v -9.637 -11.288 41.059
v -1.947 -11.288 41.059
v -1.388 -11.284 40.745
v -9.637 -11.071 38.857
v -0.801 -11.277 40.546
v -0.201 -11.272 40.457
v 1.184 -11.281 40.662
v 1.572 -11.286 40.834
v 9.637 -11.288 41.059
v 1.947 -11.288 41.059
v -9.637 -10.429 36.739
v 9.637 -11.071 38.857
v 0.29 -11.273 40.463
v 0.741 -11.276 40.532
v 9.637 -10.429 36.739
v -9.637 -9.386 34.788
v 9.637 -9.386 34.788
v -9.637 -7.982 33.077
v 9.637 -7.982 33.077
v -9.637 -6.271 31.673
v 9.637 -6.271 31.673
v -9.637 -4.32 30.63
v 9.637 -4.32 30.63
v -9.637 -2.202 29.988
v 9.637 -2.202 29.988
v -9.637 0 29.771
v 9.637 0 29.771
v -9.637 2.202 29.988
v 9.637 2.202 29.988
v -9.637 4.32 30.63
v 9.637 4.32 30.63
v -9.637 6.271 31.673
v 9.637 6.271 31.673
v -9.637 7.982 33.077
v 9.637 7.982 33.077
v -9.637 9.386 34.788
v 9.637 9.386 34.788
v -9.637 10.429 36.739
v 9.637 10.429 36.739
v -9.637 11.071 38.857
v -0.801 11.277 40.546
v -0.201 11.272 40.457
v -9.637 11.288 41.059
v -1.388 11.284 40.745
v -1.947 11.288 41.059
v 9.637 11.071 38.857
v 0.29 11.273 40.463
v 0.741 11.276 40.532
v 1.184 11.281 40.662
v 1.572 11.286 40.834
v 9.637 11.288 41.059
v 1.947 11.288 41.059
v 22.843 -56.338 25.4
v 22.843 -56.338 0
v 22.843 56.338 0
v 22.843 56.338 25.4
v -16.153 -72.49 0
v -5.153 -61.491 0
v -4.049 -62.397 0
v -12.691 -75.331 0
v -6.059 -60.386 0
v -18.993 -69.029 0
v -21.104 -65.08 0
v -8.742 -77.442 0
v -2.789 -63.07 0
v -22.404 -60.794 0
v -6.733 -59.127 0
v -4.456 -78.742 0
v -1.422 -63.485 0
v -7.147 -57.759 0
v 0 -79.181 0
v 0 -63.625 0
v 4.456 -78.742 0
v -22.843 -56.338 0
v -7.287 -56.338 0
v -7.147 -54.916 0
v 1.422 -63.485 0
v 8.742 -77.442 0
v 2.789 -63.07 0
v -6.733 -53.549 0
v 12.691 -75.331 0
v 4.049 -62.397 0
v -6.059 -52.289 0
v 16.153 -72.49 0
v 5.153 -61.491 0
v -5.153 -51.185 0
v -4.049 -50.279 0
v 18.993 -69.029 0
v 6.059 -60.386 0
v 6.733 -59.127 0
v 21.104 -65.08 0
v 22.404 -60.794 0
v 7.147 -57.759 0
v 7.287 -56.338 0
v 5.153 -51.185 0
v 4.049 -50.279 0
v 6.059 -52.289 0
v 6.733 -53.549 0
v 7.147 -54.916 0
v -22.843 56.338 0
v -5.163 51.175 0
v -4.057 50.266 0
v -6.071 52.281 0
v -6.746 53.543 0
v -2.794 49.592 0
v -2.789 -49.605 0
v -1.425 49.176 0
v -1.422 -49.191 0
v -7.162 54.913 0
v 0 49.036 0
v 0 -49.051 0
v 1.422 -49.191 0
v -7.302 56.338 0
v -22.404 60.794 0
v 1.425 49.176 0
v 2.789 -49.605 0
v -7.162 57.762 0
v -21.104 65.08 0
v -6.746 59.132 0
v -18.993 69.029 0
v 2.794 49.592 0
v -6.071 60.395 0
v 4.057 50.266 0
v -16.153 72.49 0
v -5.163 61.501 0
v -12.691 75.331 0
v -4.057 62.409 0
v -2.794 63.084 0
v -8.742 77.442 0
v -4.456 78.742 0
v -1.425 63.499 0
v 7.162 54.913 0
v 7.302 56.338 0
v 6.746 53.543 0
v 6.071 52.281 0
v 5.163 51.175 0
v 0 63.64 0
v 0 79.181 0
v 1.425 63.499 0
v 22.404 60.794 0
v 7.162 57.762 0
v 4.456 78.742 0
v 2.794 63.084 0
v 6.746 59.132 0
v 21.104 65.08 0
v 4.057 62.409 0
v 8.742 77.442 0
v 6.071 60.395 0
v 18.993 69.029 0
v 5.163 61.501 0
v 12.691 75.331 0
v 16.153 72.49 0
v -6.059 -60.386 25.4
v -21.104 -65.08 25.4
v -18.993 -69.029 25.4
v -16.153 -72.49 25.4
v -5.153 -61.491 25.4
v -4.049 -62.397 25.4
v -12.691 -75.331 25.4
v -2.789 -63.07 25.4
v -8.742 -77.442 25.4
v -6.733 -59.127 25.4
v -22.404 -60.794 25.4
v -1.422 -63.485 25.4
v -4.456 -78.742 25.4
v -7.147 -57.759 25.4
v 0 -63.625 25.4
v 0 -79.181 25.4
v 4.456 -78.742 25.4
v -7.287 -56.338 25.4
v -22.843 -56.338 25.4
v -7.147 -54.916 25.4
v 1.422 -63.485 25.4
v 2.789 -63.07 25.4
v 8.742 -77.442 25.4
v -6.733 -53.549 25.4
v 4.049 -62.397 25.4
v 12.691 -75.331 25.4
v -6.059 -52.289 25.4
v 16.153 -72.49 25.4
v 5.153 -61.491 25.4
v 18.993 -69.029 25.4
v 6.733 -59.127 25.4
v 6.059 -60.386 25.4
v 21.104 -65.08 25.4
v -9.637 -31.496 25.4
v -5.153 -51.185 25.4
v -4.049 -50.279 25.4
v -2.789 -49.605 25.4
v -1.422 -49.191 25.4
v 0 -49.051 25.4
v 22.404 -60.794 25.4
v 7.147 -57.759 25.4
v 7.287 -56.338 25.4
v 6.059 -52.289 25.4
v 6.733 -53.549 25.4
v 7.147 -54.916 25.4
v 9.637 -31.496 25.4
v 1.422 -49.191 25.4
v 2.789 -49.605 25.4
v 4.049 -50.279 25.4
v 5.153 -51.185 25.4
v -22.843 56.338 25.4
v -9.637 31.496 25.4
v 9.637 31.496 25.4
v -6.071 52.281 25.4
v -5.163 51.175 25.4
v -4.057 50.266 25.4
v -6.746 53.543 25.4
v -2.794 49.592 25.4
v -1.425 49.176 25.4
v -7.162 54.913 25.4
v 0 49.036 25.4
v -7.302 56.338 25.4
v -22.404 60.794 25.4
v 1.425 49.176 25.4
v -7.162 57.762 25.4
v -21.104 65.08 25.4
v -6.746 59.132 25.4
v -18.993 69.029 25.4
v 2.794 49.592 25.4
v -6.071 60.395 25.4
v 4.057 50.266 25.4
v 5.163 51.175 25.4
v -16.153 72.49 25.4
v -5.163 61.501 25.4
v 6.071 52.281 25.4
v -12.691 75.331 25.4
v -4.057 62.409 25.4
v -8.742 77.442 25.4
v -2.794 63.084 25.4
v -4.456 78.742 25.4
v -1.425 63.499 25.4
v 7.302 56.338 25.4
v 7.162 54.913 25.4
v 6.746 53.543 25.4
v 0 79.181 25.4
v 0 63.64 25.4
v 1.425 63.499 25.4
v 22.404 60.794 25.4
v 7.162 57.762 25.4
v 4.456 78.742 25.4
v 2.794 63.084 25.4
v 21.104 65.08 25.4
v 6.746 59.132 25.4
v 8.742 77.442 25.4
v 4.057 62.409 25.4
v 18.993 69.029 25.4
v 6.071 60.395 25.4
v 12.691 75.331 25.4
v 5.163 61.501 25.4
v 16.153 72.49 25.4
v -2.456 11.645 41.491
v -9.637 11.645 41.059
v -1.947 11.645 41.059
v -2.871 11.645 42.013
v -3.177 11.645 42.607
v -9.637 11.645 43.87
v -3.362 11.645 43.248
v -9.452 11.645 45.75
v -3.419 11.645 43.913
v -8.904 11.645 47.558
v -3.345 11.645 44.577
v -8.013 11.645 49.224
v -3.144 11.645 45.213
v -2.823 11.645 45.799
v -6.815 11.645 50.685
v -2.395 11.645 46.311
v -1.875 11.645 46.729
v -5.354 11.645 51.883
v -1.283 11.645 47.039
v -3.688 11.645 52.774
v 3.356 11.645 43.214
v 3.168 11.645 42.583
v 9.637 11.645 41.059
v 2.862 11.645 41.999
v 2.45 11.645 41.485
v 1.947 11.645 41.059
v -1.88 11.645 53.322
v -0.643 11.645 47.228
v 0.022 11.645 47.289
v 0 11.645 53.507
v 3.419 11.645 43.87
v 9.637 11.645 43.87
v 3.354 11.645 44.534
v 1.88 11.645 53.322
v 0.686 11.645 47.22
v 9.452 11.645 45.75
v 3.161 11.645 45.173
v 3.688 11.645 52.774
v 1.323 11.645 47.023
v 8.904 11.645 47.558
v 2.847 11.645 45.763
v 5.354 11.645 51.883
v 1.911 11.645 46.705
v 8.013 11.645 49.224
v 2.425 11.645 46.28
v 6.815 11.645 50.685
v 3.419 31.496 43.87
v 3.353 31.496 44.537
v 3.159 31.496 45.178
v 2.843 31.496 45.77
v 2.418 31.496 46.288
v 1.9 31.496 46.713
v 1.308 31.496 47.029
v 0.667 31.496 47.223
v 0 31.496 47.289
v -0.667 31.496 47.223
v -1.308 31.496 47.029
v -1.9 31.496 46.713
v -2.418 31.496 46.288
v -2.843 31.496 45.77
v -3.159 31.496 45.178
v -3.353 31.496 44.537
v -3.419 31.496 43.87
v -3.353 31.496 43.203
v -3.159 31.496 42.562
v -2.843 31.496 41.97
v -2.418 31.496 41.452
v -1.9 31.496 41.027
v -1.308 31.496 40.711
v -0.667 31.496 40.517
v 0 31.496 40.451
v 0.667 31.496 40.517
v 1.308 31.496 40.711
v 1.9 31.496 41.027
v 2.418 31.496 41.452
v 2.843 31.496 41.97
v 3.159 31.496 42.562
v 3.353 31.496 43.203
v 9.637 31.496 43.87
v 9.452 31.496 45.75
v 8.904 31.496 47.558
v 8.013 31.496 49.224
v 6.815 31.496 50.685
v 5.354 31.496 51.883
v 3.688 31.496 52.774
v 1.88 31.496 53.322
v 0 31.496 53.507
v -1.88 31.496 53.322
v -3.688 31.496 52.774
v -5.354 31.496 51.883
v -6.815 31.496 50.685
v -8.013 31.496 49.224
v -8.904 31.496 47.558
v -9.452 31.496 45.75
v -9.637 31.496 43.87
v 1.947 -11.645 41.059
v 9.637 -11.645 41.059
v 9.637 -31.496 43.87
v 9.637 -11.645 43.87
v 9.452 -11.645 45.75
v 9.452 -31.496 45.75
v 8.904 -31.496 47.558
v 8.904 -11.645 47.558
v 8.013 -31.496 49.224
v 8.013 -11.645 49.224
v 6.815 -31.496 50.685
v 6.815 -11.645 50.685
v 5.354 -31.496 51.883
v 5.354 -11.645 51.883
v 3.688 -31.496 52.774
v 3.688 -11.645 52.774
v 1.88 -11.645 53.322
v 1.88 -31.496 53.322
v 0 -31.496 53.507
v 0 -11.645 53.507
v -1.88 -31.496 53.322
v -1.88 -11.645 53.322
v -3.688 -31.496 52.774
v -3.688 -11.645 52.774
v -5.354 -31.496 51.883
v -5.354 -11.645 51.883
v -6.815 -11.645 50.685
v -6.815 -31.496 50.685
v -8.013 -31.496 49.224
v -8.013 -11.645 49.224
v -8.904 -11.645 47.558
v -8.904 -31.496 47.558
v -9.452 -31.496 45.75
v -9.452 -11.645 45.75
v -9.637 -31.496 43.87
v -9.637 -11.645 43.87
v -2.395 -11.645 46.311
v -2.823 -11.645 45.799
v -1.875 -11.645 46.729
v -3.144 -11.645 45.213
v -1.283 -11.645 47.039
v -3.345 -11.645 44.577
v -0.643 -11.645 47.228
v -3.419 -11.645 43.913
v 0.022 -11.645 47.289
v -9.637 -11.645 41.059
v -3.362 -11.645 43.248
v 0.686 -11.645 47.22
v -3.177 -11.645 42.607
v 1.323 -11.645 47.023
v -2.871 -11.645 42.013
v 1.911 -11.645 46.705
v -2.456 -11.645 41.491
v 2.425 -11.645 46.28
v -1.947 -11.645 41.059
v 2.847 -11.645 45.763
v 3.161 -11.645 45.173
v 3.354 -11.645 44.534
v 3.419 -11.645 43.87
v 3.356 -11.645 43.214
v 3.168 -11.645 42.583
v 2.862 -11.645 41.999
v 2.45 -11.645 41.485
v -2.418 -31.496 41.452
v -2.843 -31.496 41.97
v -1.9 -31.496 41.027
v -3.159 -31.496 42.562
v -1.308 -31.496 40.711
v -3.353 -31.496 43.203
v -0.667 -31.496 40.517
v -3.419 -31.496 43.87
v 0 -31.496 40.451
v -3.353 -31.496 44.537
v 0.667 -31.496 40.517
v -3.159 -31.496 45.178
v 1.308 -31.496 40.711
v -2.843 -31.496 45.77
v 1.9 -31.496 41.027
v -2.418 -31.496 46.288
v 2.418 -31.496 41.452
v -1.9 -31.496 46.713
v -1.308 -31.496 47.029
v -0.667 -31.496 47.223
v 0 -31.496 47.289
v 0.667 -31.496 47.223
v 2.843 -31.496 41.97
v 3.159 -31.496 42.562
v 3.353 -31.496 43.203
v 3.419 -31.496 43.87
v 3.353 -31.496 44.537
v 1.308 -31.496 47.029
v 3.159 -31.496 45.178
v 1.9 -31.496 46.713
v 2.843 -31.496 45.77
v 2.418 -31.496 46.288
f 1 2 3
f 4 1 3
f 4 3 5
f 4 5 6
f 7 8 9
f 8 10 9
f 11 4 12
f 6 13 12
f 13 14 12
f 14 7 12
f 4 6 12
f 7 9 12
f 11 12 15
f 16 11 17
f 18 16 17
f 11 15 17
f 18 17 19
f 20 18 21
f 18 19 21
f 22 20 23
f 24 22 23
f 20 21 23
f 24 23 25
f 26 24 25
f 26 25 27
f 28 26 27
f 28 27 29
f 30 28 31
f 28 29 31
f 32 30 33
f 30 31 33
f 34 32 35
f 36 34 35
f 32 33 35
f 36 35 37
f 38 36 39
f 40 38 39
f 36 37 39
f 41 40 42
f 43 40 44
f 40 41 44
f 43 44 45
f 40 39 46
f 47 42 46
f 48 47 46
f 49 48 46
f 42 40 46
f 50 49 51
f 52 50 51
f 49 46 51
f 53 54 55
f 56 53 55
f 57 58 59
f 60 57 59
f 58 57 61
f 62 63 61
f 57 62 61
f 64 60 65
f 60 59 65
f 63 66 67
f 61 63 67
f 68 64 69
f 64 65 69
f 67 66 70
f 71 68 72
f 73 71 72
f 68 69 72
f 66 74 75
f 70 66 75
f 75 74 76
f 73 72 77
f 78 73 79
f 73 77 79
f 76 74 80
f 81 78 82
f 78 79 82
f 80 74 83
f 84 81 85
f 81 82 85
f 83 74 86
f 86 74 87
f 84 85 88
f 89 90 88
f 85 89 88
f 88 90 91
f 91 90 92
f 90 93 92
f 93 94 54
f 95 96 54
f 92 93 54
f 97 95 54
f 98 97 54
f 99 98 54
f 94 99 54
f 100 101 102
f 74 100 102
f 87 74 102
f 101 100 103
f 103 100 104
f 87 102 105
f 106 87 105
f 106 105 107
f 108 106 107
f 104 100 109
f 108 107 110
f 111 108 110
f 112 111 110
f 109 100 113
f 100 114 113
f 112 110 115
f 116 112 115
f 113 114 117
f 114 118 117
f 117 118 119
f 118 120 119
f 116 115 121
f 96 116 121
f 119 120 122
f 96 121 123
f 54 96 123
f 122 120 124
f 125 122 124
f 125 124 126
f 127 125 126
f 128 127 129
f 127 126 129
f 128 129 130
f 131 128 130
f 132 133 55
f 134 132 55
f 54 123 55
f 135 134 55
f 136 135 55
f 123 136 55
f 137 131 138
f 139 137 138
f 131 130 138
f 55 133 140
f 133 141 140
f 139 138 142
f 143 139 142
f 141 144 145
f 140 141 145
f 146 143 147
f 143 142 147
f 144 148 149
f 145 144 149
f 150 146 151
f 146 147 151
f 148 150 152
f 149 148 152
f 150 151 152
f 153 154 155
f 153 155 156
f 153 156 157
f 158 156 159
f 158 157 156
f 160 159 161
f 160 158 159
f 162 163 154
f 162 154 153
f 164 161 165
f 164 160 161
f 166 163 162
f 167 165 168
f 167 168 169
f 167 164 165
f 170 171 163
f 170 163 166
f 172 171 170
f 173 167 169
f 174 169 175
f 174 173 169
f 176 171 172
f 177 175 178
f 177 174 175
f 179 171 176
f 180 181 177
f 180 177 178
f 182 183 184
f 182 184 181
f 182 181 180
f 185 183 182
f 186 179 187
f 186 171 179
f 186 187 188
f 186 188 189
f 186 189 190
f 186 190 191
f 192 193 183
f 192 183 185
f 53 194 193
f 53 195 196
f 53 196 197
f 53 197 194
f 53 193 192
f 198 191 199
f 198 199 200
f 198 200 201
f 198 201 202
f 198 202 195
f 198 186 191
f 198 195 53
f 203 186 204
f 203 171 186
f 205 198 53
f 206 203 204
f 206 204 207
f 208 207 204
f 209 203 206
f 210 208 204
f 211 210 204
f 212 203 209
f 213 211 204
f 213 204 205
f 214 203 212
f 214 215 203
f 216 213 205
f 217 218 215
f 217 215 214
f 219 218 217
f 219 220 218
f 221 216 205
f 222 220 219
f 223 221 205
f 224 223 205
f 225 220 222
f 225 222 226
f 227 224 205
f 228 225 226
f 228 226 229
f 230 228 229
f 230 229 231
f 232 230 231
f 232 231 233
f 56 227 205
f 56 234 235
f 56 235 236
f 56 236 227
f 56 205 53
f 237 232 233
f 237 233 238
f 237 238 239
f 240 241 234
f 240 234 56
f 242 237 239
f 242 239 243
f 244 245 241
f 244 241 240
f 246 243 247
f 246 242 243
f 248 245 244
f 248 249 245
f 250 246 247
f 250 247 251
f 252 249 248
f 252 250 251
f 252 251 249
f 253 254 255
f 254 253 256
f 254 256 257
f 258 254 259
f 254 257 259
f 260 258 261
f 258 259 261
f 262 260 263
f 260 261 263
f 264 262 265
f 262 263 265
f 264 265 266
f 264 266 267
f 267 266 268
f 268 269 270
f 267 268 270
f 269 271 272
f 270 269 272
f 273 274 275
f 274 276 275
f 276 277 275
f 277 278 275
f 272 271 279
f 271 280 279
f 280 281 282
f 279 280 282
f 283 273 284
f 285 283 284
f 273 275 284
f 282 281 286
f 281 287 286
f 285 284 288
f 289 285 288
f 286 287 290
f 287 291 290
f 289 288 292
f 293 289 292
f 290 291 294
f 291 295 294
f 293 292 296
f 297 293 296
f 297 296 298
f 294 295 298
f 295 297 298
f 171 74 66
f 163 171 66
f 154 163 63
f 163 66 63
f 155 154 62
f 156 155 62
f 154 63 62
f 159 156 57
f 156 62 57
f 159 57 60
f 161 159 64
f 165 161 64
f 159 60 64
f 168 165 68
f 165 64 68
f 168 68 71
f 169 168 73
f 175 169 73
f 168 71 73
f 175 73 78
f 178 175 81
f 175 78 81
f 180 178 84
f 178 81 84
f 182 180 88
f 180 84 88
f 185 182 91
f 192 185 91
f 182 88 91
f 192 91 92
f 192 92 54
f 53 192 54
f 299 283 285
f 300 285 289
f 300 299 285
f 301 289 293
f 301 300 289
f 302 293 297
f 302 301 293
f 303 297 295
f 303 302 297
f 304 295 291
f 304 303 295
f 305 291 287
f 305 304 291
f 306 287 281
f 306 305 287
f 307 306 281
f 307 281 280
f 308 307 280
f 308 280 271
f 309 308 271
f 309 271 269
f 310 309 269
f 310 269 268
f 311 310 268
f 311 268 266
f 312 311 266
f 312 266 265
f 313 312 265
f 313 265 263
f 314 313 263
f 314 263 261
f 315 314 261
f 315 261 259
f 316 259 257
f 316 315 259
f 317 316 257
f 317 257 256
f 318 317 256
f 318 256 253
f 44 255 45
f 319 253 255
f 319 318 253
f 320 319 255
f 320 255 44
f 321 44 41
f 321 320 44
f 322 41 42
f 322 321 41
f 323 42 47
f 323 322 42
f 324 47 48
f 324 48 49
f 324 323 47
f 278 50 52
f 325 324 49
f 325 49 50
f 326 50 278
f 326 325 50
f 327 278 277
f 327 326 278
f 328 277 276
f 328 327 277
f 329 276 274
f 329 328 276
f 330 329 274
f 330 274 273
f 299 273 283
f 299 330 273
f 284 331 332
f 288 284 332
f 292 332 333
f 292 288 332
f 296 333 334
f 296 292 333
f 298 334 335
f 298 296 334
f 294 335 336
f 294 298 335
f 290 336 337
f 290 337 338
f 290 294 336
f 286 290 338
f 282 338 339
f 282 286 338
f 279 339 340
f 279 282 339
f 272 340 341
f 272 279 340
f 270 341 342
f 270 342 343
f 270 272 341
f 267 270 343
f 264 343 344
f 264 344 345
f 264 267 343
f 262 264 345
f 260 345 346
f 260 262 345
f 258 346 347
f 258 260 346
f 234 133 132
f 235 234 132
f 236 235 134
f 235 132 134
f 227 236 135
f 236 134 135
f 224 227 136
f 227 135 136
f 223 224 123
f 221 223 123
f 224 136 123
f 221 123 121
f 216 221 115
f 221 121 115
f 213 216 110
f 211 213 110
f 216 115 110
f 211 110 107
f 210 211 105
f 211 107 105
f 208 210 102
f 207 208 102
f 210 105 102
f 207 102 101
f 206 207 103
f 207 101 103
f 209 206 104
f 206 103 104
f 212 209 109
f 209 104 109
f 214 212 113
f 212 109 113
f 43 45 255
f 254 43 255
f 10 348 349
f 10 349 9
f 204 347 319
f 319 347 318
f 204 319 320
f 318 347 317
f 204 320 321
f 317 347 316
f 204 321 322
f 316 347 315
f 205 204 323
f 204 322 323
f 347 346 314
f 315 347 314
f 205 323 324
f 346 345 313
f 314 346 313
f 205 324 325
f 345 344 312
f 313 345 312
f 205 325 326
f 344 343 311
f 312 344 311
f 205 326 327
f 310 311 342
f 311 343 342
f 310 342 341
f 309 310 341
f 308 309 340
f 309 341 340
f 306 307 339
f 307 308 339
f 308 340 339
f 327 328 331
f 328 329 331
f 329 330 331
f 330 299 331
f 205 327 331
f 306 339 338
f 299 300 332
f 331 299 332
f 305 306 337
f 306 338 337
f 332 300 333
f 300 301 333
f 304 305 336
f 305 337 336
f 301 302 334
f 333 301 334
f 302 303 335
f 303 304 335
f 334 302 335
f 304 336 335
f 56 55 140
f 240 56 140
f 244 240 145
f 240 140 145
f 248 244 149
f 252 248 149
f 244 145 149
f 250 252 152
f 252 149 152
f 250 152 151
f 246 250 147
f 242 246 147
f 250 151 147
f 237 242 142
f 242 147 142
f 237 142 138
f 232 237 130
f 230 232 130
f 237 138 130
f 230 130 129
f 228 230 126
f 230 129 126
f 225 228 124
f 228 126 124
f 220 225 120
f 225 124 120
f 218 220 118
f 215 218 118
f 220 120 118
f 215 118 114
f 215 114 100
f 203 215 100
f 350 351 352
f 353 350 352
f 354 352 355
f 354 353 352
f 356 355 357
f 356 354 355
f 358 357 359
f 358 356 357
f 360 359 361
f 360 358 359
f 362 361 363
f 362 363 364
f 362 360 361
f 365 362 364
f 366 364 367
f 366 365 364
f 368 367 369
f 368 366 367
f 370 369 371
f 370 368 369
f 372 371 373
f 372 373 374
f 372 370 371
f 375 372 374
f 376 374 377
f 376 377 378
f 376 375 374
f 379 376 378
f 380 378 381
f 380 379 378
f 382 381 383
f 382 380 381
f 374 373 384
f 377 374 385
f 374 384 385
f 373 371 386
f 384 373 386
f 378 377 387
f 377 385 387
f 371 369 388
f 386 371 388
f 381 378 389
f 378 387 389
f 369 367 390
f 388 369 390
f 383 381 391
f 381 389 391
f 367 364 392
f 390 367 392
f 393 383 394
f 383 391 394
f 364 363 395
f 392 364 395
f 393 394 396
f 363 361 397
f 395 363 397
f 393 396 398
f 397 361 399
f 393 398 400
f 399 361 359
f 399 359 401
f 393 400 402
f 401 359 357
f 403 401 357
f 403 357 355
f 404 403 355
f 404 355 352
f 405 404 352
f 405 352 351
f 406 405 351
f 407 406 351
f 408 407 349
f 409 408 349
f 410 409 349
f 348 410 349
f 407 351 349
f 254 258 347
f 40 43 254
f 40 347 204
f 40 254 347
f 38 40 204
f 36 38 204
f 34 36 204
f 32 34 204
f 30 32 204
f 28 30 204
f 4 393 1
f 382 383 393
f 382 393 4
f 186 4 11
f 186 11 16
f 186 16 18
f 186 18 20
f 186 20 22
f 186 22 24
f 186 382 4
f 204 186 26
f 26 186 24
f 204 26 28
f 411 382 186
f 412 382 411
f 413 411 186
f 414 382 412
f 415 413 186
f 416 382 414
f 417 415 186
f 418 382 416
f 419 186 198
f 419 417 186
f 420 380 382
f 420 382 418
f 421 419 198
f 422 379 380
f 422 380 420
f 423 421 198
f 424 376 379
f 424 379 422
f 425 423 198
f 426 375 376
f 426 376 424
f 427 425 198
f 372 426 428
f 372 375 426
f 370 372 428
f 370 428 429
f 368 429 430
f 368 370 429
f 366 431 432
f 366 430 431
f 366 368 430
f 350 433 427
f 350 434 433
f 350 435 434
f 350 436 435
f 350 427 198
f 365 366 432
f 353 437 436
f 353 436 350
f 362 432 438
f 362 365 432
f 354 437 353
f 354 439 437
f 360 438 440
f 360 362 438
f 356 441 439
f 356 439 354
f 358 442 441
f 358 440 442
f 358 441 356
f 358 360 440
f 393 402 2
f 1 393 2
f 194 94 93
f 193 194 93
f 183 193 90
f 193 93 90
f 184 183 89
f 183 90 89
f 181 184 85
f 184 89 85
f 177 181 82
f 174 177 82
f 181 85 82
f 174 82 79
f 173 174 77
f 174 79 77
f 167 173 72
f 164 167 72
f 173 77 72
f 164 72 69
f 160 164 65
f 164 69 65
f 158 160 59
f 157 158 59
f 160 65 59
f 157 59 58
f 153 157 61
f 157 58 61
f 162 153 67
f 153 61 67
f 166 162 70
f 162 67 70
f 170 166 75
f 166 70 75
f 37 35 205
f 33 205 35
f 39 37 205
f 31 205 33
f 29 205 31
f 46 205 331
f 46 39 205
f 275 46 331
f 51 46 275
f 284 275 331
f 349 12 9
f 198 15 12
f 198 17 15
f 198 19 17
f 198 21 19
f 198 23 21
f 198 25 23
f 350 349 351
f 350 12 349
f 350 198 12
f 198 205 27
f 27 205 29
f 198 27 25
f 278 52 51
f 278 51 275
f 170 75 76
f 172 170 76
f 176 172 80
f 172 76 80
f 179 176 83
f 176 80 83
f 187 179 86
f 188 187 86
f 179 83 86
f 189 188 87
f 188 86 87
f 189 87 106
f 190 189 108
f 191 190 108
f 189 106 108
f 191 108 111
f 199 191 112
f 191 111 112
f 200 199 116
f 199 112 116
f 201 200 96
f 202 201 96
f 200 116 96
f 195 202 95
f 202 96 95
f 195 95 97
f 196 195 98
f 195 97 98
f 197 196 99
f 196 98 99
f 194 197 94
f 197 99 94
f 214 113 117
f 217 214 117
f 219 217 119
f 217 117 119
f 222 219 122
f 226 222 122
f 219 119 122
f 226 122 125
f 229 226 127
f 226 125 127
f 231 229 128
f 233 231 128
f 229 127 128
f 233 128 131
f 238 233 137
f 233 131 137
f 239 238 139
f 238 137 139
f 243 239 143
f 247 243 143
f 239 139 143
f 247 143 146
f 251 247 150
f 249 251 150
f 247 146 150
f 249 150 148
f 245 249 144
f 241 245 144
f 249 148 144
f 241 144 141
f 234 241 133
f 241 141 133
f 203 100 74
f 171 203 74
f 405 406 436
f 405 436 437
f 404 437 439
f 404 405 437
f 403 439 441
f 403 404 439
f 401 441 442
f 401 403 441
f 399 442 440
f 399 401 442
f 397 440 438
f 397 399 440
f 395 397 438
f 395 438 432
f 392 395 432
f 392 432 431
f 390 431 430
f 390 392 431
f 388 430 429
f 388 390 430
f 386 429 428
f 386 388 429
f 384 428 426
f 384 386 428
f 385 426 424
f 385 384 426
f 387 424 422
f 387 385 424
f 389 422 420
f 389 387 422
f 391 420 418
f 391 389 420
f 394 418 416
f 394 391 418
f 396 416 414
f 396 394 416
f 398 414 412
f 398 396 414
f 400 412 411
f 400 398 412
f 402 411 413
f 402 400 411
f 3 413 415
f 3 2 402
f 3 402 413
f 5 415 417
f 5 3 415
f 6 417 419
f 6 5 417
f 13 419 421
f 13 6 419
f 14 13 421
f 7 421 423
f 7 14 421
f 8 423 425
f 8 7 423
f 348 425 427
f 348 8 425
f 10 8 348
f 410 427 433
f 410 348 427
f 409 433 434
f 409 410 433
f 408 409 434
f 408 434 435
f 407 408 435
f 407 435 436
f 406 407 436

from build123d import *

# Parameters (mm, degrees)
F1_DEPTH = 25.4
F2_R     = 3.419127
F3_DEPTH = 31.496
F5_DEPTH = 36.322


with BuildPart() as f1:
    # F0 (on Top) → F1 (new body)
    with BuildSketch(Plane.XY):
        with BuildLine():
            ThreePointArc((-22.843207, -56.337804), (0, -79.181011), (22.843207, -56.337804))
            Line((22.843207, -56.337804), (7.287237, -56.337804))
            ThreePointArc((7.287237, -56.337804), (0, -63.625041), (-7.287237, -56.337804))
            Line((-7.287237, -56.337804), (-22.843207, -56.337804))
        make_face()
        with BuildLine():
            Line((7.287237, -56.337804), (22.843207, -56.337804))
            Line((22.843207, -56.337804), (22.843207, 56.337804))
            Line((22.843207, 56.337804), (7.301988, 56.337804))
            ThreePointArc((7.301988, 56.337804), (0, 49.035816), (-7.301988, 56.337804))
            Line((-7.301988, 56.337804), (-22.843207, 56.337804))
            Line((-22.843207, 56.337804), (-22.843207, -56.337804))
            Line((-22.843207, -56.337804), (-7.287237, -56.337804))
            ThreePointArc((-7.287237, -56.337804), (0, -49.050566), (7.287237, -56.337804))
        make_face()
        with BuildLine():
            Line((7.301988, 56.337804), (22.843207, 56.337804))
            ThreePointArc((22.843207, 56.337804), (0, 79.181011), (-22.843207, 56.337804))
            Line((-22.843207, 56.337804), (-7.301988, 56.337804))
            ThreePointArc((-7.301988, 56.337804), (0, 63.639791), (7.301988, 56.337804))
        make_face()
    extrude(amount=F1_DEPTH)

    # F2 (on Front) → F3 (join, symmetric)
    with BuildSketch(Plane.XZ):
        with BuildLine():
            Line((-9.637341, 25.398405), (9.637341, 25.398405))
            Line((9.637341, 25.398405), (9.637341, 43.869978))
            ThreePointArc((9.637341, 43.869978), (0, 53.507319), (-9.637341, 43.869978))
            Line((-9.637341, 43.869978), (-9.637341, 25.398405))
        make_face()
        with Locations((0, 43.869978)):
            Circle(F2_R, mode=Mode.SUBTRACT)
    extrude(amount=F3_DEPTH, both=True)

    # F4 (on Right) → F5 (cut, symmetric)
    with BuildSketch(Plane.YZ):
        with BuildLine():
            Line((11.288291, 41.059084), (11.645118, 41.059084))
            Line((11.645118, 41.059084), (11.645118, 65.955549))
            Line((11.645118, 65.955549), (-11.645118, 65.955549))
            Line((-11.645118, 65.955549), (-11.645118, 41.059084))
            Line((-11.645118, 41.059084), (-11.288291, 41.059084))
            ThreePointArc((-11.288291, 41.059084), (0, 29.770793), (11.288291, 41.059084))
        make_face()
    extrude(amount=F5_DEPTH, both=True, mode=Mode.SUBTRACT)


solid = f1.part
